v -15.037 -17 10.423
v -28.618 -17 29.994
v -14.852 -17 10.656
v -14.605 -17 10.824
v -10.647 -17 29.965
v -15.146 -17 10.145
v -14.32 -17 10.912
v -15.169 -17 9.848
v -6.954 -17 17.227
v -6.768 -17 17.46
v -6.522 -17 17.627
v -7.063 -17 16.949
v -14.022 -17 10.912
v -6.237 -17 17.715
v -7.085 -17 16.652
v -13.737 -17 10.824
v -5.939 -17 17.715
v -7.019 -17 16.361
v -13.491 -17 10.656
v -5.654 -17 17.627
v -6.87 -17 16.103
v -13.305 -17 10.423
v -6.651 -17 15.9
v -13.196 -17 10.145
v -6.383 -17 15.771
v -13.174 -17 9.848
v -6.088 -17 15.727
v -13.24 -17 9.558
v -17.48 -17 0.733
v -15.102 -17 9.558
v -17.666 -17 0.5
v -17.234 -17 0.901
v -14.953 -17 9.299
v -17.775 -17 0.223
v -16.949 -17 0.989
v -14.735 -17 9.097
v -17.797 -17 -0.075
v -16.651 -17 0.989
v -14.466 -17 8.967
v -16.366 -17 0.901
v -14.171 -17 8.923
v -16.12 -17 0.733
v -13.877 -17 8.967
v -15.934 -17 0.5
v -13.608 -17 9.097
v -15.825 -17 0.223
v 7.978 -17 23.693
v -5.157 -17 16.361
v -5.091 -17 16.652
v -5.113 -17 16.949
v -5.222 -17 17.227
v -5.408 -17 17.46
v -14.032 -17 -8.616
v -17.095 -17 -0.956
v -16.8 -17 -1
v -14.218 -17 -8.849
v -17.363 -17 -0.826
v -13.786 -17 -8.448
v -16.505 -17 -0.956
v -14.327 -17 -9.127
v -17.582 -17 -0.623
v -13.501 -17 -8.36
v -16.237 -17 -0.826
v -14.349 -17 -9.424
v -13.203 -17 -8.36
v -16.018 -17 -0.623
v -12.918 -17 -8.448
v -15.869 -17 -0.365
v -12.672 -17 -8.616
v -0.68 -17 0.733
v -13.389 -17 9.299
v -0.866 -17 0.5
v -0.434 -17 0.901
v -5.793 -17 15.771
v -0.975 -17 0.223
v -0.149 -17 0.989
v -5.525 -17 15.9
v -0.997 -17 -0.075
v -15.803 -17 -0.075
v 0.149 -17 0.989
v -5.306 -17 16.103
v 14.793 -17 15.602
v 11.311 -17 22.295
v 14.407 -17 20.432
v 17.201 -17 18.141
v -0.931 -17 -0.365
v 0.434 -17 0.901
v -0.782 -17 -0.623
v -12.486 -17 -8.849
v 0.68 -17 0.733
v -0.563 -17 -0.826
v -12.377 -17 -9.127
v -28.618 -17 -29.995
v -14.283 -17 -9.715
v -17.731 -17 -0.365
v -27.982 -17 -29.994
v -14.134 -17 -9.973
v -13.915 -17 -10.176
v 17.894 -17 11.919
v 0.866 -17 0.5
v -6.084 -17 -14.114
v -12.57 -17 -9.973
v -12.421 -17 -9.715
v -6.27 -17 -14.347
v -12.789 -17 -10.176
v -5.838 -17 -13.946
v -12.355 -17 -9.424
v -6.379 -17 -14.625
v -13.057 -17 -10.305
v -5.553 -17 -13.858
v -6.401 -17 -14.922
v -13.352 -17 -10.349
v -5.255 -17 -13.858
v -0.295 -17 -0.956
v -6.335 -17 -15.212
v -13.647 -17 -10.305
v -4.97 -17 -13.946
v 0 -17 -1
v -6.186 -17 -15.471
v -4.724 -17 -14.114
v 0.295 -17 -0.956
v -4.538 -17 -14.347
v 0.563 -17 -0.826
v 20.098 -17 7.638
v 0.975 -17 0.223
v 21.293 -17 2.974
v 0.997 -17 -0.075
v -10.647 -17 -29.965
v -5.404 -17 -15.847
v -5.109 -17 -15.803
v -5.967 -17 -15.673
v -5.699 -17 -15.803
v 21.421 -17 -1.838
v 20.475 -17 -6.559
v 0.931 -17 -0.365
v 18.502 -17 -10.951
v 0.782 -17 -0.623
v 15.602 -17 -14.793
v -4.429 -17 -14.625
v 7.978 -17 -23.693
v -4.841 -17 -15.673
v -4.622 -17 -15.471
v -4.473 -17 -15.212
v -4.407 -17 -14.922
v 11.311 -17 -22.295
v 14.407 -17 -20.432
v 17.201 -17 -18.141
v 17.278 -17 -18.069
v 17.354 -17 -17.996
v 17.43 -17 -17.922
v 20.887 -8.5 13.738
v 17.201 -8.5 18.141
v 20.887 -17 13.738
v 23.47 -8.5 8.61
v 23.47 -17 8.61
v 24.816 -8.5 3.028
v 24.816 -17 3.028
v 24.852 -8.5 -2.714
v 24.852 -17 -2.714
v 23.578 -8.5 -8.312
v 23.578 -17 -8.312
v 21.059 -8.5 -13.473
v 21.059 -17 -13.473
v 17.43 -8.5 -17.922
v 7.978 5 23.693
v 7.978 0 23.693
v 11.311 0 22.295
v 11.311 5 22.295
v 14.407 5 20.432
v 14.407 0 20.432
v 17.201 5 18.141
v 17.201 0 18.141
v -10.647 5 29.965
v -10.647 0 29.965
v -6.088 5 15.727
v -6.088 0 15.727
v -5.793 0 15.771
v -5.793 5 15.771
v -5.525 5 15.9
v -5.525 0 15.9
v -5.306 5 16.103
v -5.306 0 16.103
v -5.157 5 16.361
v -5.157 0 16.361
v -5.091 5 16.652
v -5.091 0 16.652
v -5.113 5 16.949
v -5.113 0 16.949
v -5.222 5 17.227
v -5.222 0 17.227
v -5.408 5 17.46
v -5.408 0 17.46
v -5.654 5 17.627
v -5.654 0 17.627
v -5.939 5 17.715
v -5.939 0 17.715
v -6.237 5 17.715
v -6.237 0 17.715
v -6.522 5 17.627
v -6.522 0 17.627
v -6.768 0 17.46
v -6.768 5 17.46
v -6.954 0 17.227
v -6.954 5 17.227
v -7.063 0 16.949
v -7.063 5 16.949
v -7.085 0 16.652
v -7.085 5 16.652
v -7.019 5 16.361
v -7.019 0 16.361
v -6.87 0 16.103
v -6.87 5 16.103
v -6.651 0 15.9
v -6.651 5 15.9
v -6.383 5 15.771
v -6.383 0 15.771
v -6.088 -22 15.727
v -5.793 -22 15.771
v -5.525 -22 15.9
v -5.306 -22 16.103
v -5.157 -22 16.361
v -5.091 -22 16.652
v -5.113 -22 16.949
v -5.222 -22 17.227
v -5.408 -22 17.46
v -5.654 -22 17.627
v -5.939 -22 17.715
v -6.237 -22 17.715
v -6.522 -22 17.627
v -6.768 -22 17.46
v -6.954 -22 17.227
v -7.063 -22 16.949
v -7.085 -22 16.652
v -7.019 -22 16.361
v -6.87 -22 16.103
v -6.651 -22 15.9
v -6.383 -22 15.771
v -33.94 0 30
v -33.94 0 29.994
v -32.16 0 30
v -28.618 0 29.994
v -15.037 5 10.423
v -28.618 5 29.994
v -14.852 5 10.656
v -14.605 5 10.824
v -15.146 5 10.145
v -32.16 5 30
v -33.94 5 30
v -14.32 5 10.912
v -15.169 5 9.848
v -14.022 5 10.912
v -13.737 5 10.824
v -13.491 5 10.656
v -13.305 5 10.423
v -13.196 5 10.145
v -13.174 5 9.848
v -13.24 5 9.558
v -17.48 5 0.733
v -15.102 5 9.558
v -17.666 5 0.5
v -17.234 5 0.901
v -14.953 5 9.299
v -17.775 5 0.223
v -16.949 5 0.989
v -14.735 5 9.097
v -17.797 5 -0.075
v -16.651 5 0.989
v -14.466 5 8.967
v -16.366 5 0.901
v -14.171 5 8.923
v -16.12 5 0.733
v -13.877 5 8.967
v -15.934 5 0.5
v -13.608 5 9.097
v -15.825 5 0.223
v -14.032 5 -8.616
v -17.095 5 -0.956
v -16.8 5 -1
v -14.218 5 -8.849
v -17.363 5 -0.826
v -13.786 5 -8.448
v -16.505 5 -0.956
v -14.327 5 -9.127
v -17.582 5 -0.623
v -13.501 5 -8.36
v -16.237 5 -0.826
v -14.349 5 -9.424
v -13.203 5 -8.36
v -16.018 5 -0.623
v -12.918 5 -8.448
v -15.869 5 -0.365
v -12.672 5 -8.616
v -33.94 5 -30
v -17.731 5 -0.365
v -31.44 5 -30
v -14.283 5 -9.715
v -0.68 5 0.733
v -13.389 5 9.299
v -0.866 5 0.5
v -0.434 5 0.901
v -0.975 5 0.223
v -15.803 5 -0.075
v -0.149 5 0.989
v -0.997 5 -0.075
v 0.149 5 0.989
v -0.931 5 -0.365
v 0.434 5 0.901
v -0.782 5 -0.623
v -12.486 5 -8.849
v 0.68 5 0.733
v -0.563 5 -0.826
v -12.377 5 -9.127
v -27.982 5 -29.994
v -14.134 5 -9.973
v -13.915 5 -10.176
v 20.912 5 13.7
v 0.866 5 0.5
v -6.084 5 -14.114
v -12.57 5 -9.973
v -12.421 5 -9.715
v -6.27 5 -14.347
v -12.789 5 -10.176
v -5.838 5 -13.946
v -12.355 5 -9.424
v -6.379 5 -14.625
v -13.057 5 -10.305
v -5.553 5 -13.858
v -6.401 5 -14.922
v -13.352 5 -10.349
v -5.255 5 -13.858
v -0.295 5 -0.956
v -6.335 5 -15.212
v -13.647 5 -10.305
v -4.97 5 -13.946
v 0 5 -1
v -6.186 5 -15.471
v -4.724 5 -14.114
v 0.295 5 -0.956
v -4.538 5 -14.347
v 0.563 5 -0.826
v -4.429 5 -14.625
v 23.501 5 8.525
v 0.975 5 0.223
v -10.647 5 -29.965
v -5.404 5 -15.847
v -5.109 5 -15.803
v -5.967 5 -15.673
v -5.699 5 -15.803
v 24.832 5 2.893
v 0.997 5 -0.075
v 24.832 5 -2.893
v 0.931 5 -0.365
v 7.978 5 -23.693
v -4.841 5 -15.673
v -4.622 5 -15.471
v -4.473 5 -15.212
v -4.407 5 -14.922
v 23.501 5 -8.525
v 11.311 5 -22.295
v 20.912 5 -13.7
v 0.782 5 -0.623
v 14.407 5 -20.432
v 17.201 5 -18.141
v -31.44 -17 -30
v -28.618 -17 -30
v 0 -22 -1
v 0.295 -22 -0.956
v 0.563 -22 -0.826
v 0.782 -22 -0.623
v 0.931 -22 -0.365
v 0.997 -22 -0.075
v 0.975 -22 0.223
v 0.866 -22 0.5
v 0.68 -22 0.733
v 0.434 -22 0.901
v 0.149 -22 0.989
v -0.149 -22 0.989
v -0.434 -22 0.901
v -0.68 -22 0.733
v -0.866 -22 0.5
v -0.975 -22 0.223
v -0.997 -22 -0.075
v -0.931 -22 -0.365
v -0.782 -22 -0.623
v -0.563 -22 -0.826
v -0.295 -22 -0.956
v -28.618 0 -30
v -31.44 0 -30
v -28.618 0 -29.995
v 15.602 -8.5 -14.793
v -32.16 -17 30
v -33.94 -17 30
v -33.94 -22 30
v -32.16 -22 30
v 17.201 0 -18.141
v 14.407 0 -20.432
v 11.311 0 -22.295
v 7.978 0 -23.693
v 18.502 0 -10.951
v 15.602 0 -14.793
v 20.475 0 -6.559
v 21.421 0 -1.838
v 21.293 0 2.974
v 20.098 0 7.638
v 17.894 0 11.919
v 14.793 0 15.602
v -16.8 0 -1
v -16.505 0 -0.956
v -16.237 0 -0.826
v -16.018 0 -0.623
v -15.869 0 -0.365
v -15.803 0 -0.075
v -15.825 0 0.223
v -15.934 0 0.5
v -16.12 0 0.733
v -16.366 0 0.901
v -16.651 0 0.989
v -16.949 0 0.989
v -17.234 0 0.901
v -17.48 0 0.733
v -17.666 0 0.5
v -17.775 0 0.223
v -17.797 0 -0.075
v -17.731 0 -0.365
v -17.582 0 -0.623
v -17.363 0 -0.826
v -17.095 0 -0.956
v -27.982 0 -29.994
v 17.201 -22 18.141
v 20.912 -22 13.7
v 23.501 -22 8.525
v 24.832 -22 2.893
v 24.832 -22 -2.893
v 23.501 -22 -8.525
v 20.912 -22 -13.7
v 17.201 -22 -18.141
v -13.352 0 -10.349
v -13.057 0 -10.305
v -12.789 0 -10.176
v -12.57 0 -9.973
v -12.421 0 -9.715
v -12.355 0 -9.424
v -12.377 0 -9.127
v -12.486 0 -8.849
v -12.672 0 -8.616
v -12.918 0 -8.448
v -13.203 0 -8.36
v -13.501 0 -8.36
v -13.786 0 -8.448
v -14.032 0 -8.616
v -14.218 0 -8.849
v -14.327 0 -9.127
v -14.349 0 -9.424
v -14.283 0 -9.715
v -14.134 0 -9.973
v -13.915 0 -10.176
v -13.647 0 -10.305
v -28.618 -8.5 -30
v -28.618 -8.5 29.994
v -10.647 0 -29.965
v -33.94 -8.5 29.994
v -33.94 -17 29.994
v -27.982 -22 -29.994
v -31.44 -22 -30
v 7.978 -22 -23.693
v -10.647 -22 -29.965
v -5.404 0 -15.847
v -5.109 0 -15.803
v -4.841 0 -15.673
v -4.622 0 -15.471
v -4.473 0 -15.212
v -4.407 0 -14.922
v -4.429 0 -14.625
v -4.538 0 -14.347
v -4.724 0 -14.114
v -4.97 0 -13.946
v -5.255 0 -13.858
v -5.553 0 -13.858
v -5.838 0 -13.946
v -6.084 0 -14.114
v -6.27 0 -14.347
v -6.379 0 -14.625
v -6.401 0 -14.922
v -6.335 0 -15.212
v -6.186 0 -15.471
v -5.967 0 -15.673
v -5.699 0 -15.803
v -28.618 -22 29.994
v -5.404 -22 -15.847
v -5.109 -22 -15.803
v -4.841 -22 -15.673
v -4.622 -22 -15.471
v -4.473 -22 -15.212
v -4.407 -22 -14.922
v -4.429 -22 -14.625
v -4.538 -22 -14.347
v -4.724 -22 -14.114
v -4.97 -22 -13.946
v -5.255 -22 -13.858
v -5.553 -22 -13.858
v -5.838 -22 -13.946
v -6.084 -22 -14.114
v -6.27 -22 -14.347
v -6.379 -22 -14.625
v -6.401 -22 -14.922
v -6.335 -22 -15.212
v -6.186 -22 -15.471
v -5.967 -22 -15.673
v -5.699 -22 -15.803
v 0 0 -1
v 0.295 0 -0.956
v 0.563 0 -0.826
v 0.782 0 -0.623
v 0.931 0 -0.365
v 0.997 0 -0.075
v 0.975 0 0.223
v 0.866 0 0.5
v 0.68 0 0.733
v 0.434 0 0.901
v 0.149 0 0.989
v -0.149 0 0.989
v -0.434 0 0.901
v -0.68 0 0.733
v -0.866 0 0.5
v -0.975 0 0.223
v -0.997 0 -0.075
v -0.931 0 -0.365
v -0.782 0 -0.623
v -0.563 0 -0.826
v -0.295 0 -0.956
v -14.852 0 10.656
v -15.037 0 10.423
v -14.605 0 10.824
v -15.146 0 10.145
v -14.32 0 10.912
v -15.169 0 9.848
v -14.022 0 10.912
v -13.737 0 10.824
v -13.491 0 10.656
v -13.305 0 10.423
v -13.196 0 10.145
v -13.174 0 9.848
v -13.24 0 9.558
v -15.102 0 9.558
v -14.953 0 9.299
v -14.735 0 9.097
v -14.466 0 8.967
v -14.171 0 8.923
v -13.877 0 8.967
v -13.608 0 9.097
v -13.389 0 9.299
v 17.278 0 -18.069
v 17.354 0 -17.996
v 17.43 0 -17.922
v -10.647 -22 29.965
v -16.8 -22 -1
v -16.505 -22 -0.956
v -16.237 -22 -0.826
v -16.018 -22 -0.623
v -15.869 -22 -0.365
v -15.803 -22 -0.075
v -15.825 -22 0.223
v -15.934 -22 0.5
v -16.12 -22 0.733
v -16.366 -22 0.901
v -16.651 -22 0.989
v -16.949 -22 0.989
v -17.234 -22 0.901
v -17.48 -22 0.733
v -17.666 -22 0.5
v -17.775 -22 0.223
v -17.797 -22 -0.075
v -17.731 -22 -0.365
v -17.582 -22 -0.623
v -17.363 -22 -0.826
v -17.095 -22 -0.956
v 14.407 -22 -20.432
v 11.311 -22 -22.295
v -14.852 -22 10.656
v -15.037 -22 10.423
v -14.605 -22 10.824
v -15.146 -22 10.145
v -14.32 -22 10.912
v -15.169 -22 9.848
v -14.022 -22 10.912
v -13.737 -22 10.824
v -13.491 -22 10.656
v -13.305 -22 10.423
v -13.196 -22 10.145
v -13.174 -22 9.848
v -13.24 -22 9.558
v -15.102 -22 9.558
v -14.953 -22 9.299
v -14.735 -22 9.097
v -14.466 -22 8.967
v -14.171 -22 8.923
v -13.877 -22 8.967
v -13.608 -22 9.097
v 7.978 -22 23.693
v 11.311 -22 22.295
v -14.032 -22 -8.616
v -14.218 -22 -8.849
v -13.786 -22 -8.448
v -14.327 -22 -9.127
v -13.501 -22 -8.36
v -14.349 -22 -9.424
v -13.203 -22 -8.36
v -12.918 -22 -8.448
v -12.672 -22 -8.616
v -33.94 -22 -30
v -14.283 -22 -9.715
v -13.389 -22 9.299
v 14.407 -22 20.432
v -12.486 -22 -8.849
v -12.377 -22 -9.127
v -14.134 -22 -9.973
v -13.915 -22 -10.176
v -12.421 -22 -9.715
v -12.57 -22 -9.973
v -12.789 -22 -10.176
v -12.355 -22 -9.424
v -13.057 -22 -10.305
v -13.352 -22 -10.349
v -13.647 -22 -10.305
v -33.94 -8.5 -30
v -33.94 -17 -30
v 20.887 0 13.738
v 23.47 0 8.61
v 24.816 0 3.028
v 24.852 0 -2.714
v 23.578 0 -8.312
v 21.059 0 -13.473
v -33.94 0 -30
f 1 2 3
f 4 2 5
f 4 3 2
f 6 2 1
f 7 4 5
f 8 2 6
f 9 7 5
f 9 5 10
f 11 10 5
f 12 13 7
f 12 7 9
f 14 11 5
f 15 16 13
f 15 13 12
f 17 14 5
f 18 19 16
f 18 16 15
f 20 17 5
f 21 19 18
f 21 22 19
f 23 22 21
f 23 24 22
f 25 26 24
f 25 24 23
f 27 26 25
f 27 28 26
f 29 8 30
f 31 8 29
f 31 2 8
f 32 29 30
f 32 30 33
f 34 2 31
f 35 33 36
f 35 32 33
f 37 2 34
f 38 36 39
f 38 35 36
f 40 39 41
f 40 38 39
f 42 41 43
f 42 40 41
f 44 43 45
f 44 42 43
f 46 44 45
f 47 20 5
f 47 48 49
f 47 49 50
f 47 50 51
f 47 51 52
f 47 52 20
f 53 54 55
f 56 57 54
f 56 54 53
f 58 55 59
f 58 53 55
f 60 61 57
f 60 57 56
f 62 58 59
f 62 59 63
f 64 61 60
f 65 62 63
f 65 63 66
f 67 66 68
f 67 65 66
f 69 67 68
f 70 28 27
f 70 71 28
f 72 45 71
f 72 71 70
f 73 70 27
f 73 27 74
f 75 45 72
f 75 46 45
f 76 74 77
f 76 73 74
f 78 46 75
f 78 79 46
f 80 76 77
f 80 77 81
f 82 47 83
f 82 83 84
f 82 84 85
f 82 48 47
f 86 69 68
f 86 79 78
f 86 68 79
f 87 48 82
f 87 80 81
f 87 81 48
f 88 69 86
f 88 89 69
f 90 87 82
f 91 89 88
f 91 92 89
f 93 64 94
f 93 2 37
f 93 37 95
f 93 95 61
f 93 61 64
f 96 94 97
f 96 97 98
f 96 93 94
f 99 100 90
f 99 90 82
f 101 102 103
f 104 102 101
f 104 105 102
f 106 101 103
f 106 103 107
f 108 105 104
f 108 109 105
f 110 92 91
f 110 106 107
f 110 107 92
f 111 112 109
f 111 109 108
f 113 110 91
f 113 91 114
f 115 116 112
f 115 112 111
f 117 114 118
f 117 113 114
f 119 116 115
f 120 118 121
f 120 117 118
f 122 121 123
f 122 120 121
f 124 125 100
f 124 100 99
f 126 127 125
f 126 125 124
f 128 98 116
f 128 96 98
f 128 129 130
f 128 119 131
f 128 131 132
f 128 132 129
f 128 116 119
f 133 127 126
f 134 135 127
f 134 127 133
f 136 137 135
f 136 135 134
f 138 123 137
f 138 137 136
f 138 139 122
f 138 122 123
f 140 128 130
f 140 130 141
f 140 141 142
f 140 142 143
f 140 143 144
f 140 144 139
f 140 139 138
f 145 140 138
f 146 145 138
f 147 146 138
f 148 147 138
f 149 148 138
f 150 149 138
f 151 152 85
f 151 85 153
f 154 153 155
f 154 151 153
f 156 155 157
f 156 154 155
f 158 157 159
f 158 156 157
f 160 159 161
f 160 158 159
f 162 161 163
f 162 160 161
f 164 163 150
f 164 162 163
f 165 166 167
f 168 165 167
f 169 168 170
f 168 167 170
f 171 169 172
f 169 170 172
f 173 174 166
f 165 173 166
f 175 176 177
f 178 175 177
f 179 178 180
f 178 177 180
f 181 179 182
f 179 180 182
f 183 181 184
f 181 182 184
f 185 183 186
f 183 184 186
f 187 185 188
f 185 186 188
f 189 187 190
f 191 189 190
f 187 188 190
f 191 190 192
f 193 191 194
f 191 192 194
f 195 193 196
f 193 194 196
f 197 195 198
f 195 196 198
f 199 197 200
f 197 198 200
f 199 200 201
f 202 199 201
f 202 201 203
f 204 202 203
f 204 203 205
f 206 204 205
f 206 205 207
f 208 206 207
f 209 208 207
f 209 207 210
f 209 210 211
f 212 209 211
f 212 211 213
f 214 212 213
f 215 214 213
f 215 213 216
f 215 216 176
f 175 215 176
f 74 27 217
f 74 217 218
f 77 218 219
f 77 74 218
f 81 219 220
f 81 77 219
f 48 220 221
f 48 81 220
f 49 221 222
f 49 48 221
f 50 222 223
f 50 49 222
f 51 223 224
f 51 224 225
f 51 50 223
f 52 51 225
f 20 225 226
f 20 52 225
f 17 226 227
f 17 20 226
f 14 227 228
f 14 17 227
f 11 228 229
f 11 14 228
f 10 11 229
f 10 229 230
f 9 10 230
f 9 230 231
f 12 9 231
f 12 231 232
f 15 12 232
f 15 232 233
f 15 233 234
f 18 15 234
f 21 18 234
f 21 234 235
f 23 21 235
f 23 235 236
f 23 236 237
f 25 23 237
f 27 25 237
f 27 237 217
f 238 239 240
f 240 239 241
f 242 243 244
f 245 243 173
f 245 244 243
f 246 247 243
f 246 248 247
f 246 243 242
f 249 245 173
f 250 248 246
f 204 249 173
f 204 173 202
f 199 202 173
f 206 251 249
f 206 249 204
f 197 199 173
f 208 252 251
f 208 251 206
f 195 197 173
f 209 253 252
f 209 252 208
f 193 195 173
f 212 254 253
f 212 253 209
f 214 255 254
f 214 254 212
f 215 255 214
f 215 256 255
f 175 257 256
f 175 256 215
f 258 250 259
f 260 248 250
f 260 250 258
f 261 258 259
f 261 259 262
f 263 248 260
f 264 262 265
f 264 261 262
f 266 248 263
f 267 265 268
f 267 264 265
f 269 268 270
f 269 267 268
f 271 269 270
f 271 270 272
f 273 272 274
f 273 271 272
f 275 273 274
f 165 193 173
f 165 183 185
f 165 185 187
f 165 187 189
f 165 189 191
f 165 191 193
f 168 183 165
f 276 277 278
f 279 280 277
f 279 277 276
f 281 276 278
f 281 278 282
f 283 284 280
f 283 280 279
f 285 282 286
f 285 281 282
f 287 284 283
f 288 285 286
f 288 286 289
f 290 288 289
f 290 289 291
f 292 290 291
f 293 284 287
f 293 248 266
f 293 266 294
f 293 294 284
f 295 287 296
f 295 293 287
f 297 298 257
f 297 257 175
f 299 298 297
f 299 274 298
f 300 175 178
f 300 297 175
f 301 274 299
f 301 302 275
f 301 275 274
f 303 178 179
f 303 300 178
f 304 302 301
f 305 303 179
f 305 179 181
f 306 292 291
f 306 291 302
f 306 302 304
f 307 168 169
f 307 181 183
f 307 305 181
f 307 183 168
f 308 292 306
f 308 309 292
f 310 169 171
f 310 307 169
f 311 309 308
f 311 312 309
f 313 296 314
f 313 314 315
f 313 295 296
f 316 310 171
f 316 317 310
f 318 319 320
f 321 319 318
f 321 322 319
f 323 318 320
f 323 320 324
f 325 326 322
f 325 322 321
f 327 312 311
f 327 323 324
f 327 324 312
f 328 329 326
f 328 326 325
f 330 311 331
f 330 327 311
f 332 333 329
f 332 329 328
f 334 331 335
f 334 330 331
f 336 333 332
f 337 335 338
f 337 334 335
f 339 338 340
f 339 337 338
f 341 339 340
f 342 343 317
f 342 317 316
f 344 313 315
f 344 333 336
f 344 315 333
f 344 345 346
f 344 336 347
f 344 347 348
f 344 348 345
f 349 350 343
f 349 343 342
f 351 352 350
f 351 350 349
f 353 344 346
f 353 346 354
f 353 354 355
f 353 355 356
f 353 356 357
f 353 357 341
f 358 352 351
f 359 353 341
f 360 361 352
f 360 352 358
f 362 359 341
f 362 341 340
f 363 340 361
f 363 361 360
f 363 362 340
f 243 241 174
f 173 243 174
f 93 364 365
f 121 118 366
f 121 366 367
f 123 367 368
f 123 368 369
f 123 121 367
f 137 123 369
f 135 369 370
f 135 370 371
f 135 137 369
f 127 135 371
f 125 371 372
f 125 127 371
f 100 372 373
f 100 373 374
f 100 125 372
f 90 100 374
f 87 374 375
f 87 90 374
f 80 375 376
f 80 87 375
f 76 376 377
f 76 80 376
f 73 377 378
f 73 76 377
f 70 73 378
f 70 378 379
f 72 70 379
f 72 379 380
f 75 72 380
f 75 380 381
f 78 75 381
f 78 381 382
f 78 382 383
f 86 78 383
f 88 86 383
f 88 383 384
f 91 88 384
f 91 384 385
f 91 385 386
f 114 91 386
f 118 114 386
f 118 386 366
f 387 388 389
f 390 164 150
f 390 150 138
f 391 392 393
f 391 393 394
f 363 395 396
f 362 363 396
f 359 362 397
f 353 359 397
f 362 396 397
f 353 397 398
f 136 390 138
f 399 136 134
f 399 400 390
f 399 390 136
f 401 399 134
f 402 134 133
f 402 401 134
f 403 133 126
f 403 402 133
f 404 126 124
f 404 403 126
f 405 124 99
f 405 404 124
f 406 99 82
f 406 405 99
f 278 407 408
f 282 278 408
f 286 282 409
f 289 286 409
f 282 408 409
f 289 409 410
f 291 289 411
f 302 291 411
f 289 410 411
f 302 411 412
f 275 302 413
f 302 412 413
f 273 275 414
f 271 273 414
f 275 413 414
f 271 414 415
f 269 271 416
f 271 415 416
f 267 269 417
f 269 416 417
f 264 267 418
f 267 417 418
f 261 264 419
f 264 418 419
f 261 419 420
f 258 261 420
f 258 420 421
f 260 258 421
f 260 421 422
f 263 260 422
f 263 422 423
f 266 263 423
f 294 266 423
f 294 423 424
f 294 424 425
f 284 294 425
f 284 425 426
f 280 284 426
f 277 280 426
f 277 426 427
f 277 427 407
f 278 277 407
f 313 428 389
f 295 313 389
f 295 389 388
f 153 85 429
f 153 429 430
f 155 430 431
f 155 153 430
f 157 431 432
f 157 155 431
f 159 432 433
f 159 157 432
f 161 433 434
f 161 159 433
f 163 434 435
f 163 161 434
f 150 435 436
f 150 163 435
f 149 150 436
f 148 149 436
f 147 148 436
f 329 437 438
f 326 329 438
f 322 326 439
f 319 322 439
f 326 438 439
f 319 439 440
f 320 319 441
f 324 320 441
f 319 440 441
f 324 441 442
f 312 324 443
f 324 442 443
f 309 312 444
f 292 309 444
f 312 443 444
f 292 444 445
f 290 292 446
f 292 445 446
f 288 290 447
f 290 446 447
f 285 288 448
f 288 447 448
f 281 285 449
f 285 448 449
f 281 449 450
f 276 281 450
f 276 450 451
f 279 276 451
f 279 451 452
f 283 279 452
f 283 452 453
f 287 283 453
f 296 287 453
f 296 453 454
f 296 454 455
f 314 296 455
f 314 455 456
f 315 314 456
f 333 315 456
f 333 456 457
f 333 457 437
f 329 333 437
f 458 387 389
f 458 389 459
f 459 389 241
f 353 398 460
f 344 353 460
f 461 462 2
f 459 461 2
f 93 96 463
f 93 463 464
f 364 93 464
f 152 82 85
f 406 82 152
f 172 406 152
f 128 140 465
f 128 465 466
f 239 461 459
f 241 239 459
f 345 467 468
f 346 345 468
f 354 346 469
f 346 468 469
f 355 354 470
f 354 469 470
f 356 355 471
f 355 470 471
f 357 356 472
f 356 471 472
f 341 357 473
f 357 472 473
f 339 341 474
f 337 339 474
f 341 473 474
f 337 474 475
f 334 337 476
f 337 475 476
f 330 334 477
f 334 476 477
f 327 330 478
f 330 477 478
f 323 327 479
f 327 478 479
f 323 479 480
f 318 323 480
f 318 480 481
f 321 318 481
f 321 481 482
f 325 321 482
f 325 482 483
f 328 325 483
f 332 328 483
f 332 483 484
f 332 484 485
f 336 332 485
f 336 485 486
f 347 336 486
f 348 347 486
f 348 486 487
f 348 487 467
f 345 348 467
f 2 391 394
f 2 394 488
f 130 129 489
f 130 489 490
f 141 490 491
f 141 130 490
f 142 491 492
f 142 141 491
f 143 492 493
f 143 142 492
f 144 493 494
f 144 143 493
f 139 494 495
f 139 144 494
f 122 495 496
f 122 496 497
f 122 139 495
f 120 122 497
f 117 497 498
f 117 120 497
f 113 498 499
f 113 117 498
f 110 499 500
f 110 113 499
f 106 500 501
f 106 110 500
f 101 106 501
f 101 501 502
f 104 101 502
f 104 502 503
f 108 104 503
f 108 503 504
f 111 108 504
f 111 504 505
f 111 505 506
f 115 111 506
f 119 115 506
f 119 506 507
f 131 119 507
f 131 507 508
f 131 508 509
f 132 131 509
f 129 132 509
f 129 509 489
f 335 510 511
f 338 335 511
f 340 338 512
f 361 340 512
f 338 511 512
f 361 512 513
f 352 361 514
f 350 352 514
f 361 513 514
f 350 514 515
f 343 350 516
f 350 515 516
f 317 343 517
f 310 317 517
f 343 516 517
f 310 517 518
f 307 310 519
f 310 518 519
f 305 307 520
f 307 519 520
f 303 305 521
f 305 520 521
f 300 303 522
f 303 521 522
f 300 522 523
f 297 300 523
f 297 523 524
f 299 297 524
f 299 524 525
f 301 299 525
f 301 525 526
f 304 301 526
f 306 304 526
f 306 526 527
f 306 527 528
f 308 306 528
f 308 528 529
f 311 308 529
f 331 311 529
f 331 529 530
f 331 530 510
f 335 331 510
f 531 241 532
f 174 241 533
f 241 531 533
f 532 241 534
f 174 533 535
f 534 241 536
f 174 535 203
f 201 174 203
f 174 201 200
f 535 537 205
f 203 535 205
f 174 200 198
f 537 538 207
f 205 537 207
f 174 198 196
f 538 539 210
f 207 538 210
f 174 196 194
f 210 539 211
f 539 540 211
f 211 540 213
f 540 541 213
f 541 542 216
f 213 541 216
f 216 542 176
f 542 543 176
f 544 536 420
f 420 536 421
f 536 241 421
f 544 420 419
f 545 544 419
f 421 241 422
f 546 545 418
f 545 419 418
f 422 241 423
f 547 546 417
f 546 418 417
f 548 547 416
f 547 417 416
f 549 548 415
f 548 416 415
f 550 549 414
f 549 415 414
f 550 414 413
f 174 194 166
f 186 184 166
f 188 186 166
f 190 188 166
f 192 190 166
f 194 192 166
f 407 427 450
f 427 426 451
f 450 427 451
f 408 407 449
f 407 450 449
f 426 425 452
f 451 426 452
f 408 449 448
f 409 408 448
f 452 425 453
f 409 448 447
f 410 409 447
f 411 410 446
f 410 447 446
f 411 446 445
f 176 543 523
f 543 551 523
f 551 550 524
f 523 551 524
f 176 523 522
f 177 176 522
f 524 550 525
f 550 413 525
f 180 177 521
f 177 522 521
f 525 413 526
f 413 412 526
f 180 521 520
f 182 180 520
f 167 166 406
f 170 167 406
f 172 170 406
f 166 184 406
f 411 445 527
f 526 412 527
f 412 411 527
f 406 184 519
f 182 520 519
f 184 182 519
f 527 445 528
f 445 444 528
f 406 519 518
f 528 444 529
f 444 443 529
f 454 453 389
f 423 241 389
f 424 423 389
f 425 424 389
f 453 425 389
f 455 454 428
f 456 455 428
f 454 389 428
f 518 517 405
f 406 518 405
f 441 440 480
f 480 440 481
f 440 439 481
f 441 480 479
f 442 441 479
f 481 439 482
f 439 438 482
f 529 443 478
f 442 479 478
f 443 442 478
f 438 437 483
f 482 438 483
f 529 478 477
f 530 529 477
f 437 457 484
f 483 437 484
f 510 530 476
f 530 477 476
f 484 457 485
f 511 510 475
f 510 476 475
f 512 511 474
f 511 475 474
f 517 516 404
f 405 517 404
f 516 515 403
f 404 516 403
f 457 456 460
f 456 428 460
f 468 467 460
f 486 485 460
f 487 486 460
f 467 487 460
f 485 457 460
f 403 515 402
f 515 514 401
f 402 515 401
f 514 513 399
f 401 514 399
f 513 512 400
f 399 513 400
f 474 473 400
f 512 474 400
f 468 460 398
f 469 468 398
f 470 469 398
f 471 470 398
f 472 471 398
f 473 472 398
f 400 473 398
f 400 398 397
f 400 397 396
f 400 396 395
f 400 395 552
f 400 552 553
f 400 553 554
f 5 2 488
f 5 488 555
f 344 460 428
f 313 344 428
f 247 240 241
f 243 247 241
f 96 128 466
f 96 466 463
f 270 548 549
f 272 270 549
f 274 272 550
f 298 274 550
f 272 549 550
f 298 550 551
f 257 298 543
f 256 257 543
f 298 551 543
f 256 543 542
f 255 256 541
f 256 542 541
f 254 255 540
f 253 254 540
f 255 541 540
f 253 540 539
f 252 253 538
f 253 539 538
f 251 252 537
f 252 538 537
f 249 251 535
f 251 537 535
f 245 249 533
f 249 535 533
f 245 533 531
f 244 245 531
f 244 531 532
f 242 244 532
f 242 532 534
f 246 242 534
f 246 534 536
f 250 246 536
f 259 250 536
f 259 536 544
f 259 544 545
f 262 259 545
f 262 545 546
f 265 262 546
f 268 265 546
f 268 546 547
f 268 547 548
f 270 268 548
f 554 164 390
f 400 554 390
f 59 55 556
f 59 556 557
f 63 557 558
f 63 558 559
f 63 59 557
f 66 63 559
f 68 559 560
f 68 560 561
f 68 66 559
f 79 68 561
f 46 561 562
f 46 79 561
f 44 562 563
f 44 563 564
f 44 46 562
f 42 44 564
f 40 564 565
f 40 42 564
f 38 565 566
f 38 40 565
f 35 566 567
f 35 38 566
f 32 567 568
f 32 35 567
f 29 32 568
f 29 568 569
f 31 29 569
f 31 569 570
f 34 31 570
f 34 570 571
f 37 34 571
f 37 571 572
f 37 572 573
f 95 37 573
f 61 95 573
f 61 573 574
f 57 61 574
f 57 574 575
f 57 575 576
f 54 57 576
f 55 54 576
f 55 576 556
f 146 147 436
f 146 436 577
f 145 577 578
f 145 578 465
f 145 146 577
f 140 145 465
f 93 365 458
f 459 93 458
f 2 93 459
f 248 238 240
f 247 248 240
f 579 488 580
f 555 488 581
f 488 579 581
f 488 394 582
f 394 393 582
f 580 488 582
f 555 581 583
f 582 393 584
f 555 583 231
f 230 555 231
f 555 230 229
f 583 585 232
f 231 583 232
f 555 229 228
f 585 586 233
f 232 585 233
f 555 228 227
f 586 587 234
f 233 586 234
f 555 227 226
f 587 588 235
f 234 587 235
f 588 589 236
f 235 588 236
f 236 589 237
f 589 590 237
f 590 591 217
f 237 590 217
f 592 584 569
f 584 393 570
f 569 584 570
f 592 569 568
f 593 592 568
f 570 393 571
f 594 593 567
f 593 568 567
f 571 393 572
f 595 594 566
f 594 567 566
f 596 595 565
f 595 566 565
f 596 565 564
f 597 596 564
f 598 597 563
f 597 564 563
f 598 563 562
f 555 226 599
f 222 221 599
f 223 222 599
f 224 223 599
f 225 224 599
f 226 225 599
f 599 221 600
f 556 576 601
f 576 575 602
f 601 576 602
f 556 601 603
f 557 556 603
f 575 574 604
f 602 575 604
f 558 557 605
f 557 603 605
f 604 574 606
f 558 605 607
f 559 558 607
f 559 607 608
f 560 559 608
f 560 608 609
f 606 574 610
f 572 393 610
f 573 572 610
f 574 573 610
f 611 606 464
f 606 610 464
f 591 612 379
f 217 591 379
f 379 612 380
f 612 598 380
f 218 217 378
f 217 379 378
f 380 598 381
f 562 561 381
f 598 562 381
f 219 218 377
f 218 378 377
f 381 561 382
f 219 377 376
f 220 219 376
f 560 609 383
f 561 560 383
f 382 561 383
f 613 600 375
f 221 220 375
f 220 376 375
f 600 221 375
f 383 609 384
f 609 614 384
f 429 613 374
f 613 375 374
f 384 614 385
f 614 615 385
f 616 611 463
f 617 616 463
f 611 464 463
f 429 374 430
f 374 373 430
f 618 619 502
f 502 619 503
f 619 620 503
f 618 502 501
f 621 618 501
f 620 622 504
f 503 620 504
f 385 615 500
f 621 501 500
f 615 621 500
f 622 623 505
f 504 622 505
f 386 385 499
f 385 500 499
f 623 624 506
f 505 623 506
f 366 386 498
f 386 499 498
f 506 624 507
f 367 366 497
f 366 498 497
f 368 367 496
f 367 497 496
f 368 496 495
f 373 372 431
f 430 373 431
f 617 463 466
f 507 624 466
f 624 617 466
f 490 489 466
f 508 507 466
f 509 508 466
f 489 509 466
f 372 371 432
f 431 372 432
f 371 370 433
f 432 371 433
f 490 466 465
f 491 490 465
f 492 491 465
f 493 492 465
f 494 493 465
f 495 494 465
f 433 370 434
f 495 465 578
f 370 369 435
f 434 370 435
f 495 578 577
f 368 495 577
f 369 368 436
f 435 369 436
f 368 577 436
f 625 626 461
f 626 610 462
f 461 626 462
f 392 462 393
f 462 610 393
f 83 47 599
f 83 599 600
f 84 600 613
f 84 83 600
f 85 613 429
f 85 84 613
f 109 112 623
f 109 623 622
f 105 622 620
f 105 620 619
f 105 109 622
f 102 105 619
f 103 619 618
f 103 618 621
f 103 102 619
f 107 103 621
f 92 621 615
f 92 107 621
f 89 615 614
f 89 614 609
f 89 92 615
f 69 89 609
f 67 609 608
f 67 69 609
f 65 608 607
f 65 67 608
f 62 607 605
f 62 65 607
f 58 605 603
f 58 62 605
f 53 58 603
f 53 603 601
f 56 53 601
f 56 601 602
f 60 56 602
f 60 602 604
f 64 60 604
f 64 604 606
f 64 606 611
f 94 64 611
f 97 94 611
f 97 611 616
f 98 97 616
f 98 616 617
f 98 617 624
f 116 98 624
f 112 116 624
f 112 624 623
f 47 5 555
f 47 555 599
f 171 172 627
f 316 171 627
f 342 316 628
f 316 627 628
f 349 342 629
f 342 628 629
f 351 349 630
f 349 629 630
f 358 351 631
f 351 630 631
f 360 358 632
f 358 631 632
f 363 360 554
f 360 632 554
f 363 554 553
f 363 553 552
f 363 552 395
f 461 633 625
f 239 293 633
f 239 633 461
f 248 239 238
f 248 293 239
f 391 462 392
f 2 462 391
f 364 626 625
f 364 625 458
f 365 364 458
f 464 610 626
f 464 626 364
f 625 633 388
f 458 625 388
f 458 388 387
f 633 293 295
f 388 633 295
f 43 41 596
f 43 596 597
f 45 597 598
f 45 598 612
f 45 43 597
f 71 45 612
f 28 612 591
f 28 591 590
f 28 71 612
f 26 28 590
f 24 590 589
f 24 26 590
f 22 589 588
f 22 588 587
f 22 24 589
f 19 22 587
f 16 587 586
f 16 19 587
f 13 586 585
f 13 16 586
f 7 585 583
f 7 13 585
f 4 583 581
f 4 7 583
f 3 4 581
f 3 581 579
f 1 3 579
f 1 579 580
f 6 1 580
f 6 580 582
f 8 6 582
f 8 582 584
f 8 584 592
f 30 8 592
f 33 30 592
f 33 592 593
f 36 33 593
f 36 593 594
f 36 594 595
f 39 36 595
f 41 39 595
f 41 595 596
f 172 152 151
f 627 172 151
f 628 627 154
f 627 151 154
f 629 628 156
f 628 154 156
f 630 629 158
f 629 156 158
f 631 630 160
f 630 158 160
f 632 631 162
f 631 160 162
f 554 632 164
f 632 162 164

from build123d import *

# Parameters (mm, degrees)
BOSS_EXTRUDE2_DEPTH = 5
SKETCH5_W           = 5.32214827
SKETCH5_H           = 59.994190195
BOSS_EXTRUDE4_DEPTH = 8.5
BOSS_EXTRUDE5_START = 8.5
BOSS_EXTRUDE5_DEPTH = 8.5
SKETCH7_R           = 1
CUT_EXTRUDE1_DEPTH  = 8.5


with BuildPart() as part:
    # Sketch1 → Boss-Extrude2 (new body)
    with BuildSketch(Plane(origin=(0, 0, 0), x_dir=(1, 0, 0), z_dir=(0, 1, 0))):
        with BuildLine():
            Line((-32.160092199, -30), (-28.617759531, -29.994190195))
            Line((-28.617759531, -29.994190195), (-10.646867834, -29.964716006))
            Line((-10.646867834, -29.964716006), (7.978436277, -23.692711001))
            ThreePointArc((7.978436277, -23.692711001), (12.892303289, -21.419349101), (17.201484904, -18.141359296))
            ThreePointArc((17.201484904, -18.141359296), (25, 0), (17.201484904, 18.141359296))
            ThreePointArc((17.201484904, 18.141359296), (12.892303289, 21.419349101), (7.978436277, 23.692711001))
            Line((7.978436277, 23.692711001), (-10.646867834, 29.964716006))
            Line((-10.646867834, 29.964716006), (-27.981736935, 29.994131783))
            Line((-27.981736935, 29.994131783), (-31.439907801, 30))
            Line((-31.439907801, 30), (-33.939907801, 30))
            Line((-33.939907801, 30), (-33.939907801, -30))
            Line((-33.939907801, -30), (-32.160092199, -30))
        make_face()
    extrude(amount=BOSS_EXTRUDE2_DEPTH)

    # Sketch5 → Boss-Extrude4 (add)
    with BuildSketch(Plane.XZ):
        with Locations((-31.278833666, -0.002904903)):
            Rectangle(SKETCH5_W, SKETCH5_H)
    extrude(amount=BOSS_EXTRUDE4_DEPTH)

    # Sketch6 → Boss-Extrude5 (add)
    with BuildSketch(Plane.XZ.offset(BOSS_EXTRUDE5_START)):
        with BuildLine():
            Line((14.793277017, 15.601568994), (17.201484904, 18.141359296))
            ThreePointArc((17.201484904, 18.141359296), (24.999499268, 0.15822873), (17.429740925, -17.92216871))
            Line((17.429740925, -17.92216871), (15.601568994, -14.793277017))
            ThreePointArc((15.601568994, -14.793277017), (21.492401728, 0.571548738), (14.793277017, 15.601568994))
        make_face()
    extrude(amount=-BOSS_EXTRUDE5_DEPTH)

    # Sketch7 → Cut-Extrude1 (cut)
    with BuildSketch(Plane.XZ):
        with Locations(Location((-6.087958551, 16.72652865, 0), (0, 0, 270))):
            Circle(SKETCH7_R)
        with Locations(Location((0, 0, 0), (0, 0, 270))):
            Circle(SKETCH7_R)
        with Locations(Location((-14.171330366, 9.922872349, 0), (0, 0, 270))):
            Circle(SKETCH7_R)
        with Locations(Location((-16.8, 0, 0), (0, 0, 270))):
            Circle(SKETCH7_R)
        with Locations(Location((-13.352178322, -9.349295913, 0), (0, 0, 270))):
            Circle(SKETCH7_R)
        with Locations(Location((-5.403918265, -14.847143408, 0), (0, 0, 270))):
            Circle(SKETCH7_R)
    extrude(amount=-CUT_EXTRUDE1_DEPTH, mode=Mode.SUBTRACT)

    # Mirror1: part across plane


with BuildPart() as part_1:
    add(part.part)
    add(part.part.mirror(Plane.ZX.offset(-8.5)))


solid = part_1.part
